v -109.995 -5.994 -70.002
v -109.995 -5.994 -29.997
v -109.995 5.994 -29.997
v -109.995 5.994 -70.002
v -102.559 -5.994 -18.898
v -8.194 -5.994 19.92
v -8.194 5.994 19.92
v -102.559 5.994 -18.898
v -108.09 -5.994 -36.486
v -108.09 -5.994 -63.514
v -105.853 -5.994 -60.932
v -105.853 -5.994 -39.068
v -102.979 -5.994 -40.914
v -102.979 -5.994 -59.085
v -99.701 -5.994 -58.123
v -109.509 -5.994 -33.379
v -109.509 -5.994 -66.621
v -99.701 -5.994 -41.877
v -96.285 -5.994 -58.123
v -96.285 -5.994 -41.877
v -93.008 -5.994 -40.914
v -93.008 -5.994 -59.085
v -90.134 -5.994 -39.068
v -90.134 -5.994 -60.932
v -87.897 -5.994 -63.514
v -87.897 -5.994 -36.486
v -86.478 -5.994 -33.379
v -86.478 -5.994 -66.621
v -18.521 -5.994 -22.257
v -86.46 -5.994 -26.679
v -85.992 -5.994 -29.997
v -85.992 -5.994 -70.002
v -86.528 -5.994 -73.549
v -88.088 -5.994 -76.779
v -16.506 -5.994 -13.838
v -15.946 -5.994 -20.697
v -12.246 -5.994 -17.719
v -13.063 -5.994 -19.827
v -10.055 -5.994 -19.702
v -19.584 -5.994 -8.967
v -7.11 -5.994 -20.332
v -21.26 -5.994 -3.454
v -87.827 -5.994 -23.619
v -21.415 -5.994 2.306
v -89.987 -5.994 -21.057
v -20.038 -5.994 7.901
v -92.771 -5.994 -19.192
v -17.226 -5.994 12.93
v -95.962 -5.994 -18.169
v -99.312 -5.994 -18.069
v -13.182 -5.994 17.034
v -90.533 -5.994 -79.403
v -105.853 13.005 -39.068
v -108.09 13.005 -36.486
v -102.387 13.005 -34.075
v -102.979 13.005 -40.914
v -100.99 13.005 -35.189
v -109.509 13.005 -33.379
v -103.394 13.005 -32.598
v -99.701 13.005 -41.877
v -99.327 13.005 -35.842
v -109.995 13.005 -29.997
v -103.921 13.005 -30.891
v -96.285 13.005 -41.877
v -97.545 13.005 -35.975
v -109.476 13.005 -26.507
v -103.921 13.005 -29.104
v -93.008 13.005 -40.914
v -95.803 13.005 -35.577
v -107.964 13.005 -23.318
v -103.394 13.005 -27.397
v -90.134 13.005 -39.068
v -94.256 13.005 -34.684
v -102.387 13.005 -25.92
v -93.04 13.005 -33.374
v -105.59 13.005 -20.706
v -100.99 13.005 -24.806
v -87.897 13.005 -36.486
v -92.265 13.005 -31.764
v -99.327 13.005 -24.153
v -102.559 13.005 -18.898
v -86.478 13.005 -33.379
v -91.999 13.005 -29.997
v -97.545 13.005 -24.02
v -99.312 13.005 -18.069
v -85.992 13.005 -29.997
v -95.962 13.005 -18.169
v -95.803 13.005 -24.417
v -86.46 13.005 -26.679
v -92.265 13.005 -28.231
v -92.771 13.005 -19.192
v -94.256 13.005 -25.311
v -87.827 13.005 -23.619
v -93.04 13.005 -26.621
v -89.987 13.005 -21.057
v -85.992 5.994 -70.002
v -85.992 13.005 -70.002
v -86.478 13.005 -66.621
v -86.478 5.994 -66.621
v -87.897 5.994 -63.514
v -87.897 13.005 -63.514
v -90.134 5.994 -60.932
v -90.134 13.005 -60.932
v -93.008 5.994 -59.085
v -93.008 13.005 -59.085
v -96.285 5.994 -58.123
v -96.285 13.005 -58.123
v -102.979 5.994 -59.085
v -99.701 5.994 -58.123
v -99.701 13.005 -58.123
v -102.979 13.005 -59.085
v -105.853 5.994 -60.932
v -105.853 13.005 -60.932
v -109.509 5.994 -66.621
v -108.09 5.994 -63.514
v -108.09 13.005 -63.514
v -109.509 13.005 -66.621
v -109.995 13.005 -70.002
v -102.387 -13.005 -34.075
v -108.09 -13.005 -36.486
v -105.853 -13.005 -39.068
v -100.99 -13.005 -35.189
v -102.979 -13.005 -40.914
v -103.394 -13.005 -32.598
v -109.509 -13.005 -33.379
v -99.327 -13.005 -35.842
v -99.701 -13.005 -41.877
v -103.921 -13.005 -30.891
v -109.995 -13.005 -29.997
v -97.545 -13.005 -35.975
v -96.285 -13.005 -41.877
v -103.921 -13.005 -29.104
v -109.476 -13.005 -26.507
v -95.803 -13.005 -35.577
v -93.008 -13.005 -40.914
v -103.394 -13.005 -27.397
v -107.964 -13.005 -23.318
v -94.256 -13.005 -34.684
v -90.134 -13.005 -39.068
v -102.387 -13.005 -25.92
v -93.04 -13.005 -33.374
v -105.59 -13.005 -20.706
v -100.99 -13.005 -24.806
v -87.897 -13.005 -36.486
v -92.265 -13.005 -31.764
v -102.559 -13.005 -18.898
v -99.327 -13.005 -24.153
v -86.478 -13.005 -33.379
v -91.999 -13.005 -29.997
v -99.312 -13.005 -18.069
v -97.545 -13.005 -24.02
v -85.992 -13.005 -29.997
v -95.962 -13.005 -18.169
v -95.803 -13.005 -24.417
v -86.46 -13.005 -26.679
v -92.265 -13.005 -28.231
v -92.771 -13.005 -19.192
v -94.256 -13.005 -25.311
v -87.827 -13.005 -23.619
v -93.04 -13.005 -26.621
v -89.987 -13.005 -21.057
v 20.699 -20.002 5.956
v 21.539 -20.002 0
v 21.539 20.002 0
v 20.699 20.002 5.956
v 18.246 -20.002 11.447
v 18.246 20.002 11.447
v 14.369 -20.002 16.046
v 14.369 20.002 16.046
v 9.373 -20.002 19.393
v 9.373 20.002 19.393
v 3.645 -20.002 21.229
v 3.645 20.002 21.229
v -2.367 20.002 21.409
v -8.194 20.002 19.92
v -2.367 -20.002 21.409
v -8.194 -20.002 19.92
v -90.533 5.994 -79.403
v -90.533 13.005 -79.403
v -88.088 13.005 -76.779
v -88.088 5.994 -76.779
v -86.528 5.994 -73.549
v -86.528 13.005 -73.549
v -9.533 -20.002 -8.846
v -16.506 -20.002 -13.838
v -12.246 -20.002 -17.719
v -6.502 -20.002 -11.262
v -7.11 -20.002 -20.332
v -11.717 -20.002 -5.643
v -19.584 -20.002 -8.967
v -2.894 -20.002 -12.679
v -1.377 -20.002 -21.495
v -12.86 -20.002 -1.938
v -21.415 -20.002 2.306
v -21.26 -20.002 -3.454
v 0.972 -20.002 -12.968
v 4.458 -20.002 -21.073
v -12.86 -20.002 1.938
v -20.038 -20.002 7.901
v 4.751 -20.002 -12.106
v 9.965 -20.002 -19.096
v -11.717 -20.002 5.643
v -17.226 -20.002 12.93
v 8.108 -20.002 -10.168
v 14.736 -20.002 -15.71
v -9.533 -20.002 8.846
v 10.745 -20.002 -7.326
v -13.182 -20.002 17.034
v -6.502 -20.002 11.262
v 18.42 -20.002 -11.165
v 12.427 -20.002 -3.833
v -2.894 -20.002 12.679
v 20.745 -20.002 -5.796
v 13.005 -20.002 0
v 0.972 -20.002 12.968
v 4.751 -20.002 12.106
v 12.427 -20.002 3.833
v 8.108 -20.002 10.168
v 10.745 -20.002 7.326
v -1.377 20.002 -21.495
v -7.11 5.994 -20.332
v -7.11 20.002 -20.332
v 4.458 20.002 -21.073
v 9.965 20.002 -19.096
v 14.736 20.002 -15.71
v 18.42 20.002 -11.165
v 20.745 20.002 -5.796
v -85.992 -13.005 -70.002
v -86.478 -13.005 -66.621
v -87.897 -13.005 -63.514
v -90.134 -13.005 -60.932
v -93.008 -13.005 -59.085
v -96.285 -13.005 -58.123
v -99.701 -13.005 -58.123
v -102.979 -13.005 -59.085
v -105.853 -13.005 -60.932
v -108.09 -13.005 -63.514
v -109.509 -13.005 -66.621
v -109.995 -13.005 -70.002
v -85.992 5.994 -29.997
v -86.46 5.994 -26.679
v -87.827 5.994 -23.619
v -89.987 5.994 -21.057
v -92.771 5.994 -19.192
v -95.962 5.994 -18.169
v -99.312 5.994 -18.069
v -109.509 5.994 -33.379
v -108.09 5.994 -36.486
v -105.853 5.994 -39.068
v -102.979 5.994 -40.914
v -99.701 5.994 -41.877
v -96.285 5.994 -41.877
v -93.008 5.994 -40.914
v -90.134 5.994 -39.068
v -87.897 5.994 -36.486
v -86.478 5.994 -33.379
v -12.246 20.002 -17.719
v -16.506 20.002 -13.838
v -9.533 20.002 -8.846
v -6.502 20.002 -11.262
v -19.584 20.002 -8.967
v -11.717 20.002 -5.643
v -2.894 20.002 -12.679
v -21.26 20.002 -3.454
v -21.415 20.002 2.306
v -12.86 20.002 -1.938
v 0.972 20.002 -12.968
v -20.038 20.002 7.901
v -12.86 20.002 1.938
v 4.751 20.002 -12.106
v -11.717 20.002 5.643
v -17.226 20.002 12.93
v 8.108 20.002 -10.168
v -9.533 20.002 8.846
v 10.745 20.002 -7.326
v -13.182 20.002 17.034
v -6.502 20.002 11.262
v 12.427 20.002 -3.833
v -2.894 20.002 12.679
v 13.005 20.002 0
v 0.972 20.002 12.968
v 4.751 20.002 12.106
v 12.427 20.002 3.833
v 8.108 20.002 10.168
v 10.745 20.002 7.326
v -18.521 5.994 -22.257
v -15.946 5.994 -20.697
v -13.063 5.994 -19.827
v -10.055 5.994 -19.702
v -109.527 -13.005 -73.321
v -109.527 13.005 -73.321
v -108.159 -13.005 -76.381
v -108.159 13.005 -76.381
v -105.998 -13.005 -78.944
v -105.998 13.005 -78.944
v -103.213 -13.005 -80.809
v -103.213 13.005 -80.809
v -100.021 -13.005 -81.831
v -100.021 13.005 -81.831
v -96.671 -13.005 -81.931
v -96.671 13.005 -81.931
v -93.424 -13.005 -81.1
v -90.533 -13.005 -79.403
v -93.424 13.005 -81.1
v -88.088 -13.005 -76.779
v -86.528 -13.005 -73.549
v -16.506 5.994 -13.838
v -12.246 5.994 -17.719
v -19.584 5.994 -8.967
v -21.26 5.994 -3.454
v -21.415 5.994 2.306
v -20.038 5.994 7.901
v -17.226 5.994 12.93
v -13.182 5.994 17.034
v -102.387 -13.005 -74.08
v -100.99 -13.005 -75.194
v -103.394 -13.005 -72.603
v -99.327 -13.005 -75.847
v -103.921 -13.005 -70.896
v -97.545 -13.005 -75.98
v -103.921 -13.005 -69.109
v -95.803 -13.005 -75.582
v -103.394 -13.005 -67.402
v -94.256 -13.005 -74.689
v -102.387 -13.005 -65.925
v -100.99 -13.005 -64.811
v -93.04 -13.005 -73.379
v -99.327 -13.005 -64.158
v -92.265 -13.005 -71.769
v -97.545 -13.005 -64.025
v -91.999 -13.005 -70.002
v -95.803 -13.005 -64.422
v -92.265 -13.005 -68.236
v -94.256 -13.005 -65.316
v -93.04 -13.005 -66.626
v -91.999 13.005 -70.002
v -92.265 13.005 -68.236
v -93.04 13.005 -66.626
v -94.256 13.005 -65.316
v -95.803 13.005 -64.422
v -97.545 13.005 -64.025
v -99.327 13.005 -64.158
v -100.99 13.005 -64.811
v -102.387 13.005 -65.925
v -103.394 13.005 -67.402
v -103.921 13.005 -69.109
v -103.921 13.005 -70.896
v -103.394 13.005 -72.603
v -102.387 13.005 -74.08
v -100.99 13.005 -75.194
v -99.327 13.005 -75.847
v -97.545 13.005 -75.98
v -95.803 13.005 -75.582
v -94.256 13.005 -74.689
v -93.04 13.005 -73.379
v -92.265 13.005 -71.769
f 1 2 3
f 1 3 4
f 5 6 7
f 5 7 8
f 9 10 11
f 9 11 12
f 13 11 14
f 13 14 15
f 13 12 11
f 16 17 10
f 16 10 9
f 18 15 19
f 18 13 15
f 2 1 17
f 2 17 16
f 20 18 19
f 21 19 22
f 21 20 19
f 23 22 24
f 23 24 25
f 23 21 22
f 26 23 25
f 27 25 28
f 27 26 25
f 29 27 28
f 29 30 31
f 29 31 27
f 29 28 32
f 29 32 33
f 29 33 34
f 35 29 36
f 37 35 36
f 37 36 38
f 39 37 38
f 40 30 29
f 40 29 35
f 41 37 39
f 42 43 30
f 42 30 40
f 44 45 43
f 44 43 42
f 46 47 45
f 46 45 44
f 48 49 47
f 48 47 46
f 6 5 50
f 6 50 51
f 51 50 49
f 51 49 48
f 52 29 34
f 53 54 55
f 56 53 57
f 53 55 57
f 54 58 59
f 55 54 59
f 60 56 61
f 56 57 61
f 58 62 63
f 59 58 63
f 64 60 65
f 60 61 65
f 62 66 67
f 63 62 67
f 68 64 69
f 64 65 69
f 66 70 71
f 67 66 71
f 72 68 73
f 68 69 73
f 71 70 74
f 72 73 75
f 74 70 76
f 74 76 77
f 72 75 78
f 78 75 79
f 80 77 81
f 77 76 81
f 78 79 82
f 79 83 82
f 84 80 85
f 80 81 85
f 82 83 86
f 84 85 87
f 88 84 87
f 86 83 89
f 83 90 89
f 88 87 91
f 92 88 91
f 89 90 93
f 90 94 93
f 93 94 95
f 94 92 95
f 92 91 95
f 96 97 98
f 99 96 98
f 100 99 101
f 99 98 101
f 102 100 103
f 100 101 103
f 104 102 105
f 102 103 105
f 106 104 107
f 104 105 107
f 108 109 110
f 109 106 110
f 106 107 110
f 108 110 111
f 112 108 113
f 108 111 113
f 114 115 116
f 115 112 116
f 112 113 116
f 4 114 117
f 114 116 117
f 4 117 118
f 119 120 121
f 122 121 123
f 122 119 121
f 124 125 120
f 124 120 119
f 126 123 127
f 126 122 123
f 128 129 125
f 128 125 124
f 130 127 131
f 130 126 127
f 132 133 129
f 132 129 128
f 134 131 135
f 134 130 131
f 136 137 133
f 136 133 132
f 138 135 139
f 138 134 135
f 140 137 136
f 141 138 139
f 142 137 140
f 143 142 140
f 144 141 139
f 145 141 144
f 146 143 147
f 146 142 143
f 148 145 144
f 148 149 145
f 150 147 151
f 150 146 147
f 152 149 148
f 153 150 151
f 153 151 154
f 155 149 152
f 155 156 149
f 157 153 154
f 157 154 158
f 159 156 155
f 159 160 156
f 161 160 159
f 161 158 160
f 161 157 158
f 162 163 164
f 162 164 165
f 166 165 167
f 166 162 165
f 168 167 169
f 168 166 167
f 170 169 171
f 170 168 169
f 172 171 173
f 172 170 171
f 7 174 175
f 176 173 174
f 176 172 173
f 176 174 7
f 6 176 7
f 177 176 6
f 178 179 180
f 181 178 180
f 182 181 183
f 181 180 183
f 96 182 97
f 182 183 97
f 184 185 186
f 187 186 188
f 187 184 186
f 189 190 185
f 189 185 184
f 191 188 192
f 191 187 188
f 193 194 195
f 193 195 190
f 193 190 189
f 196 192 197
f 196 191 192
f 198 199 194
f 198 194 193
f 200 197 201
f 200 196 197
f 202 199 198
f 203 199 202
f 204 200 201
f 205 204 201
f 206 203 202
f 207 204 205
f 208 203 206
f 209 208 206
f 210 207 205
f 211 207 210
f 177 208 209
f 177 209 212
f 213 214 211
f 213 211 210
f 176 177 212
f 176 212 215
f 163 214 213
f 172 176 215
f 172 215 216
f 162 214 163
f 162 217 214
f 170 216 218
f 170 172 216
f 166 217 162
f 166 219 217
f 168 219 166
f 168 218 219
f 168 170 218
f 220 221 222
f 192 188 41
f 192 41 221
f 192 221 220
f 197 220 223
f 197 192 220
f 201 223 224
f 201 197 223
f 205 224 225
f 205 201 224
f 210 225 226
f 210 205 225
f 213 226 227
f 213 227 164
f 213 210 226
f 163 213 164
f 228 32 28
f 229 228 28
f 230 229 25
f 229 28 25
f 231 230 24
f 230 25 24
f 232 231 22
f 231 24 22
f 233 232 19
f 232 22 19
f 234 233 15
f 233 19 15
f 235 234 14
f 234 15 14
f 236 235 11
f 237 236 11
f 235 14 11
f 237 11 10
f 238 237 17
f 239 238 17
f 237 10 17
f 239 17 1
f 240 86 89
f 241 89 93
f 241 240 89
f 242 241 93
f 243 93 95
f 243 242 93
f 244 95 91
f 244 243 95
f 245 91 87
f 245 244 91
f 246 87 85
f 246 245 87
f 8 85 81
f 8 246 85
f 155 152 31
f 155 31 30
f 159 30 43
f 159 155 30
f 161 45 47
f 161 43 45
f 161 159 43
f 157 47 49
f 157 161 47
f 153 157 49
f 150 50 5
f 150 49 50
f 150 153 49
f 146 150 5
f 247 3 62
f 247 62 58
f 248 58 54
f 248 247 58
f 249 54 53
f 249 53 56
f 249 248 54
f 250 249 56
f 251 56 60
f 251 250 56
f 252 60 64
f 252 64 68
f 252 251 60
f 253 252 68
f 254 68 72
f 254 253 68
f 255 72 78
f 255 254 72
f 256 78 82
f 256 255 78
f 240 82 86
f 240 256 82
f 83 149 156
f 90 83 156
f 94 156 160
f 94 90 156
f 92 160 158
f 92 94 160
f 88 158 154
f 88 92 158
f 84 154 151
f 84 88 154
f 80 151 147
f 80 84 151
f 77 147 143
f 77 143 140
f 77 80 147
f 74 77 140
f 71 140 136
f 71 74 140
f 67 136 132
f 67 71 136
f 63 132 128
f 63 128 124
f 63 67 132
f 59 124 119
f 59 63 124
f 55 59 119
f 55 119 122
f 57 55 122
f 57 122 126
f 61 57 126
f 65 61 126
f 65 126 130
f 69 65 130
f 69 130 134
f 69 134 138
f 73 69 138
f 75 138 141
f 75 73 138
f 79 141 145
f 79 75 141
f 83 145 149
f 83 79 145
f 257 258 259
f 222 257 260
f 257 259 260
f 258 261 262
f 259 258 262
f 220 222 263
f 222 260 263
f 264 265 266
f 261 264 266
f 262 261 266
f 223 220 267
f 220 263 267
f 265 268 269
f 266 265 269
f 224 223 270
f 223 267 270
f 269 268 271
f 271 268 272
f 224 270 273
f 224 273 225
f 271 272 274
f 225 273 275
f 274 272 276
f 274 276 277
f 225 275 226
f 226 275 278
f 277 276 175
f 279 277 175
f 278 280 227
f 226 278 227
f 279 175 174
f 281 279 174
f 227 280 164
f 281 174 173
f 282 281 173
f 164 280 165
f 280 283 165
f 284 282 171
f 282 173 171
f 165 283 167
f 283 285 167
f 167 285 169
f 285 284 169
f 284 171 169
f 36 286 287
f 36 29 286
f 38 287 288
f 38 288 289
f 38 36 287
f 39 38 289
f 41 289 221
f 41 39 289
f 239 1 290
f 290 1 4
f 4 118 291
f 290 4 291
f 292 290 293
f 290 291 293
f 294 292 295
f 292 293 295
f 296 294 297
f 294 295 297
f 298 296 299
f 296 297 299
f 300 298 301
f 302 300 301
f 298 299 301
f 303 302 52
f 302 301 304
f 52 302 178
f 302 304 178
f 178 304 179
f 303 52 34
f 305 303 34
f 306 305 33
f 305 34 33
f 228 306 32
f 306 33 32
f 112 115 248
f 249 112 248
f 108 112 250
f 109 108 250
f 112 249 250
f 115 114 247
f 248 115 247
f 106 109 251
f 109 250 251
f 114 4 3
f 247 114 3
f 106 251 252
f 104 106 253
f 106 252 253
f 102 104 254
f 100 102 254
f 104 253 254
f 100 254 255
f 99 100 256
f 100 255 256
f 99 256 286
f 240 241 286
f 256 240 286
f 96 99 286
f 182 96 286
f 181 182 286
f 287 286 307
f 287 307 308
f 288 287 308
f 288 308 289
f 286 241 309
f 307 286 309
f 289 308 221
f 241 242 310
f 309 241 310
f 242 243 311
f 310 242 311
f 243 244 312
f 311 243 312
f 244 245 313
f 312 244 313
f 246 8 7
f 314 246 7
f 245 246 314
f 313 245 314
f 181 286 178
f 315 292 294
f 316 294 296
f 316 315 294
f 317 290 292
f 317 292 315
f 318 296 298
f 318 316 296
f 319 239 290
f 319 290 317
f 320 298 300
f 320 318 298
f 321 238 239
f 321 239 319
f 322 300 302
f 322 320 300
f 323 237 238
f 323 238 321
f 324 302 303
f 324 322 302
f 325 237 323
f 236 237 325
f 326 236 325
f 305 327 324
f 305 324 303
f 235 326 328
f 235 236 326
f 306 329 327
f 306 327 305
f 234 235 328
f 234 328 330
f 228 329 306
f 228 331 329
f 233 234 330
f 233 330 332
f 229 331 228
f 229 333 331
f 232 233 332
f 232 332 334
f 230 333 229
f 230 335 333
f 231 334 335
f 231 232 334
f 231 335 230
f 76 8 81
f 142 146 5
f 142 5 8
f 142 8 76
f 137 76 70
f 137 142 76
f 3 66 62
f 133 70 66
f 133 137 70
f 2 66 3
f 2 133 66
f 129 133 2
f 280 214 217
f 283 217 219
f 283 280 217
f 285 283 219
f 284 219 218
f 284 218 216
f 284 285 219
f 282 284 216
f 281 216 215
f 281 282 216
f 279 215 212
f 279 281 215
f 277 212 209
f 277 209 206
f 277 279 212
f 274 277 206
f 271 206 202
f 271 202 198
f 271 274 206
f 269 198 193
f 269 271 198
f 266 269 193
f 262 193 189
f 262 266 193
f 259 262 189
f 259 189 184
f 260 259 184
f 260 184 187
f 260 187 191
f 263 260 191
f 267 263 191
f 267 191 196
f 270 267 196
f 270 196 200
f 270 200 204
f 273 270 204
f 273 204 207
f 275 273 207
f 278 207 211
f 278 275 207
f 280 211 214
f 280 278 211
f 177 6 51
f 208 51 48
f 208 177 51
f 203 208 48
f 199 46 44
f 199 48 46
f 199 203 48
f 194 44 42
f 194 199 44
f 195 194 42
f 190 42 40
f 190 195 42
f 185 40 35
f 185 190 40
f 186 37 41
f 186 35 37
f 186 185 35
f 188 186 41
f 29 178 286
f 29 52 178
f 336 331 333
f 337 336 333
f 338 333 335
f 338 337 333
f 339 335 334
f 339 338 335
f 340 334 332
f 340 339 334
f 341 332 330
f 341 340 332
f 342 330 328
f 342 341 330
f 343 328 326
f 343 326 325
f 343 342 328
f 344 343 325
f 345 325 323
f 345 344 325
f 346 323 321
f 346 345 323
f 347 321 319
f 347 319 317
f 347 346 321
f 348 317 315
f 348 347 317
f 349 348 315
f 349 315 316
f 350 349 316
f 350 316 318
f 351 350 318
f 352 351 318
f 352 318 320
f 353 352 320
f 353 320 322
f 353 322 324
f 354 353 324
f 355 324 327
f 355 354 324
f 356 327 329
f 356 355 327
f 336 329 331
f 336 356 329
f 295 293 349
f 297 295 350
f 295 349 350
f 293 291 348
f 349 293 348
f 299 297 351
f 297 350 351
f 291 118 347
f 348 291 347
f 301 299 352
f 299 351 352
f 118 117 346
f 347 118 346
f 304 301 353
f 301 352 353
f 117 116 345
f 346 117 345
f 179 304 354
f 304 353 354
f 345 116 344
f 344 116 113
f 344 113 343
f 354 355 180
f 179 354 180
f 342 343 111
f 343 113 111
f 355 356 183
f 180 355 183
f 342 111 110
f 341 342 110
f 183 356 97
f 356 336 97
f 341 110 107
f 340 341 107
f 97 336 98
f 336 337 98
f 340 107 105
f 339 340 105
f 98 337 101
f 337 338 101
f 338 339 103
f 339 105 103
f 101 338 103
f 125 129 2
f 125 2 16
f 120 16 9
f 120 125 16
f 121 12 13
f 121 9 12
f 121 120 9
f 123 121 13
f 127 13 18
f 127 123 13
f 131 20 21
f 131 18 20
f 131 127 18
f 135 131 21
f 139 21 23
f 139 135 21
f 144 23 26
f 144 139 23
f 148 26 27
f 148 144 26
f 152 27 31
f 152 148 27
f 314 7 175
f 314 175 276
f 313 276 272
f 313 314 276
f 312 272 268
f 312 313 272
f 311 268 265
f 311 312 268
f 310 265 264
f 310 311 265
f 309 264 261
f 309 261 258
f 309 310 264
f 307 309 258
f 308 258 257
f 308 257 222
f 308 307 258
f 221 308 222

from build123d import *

# Parameters (mm, degrees)
F0_R     = 13.0048
F1_DEPTH = 20.0025
F2_DEPTH = 5.9944
F0_R_2   = 5.9944
F3_DEPTH = 13.0048


with BuildPart() as f1:
    # F0 (on Front) → F1 (new body, symmetric)
    with BuildSketch(Plane.XZ):
        with BuildLine():
            ThreePointArc((-7.110495, -20.331699), (12.465608, -17.56547), (21.5392, 0))
            ThreePointArc((21.5392, 0), (11.988357, 17.894593), (-8.194164, 19.919659))
            ThreePointArc((-8.194164, 19.919659), (-21.531398, -0.57968), (-7.110495, -20.331699))
        make_face()
        Circle(F0_R, mode=Mode.SUBTRACT)
    extrude(amount=F1_DEPTH, both=True)

    # F0 (on Front) → F2 (join, symmetric)
    with BuildSketch(Plane.XZ):
        with BuildLine():
            ThreePointArc((-7.110495, -20.331699), (-21.531398, -0.57968), (-8.194164, 19.919659))
            Line((-8.194164, 19.919659), (-102.558934, -18.898298))
            ThreePointArc((-102.558934, -18.898298), (-91.313367, -20.026651), (-85.9917, -29.9974))
            ThreePointArc((-85.9917, -29.9974), (-97.9932, -41.9989), (-109.9947, -29.9974))
            Line((-109.9947, -29.9974), (-109.9947, -70.0024))
            ThreePointArc((-109.9947, -70.0024), (-97.9932, -58.0009), (-85.9917, -70.0024))
            ThreePointArc((-85.9917, -70.0024), (-87.186467, -75.222604), (-90.532888, -79.40345))
            Line((-90.532888, -79.40345), (-18.520641, -22.257298))
            ThreePointArc((-18.520641, -22.257298), (-13.063266, -19.826762), (-7.110495, -20.331699))
        make_face()
    extrude(amount=F2_DEPTH, both=True)

    # F0 (on Front) → F3 (join, symmetric)
    with BuildSketch(Plane.XZ):
        with BuildLine():
            ThreePointArc((-109.9947, -70.0024), (-103.213404, -80.809133), (-90.532888, -79.40345))
            ThreePointArc((-90.532888, -79.40345), (-87.186467, -75.222604), (-85.9917, -70.0024))
            ThreePointArc((-85.9917, -70.0024), (-97.9932, -58.0009), (-109.9947, -70.0024))
        make_face()
        with Locations((-97.9932, -70.0024)):
            Circle(F0_R_2, mode=Mode.SUBTRACT)
        with BuildLine():
            ThreePointArc((-85.9917, -29.9974), (-91.313367, -20.026651), (-102.558934, -18.898298))
            ThreePointArc((-102.558934, -18.898298), (-107.963949, -23.317567), (-109.9947, -29.9974))
            ThreePointArc((-109.9947, -29.9974), (-97.9932, -41.9989), (-85.9917, -29.9974))
        make_face()
        with Locations((-97.9932, -29.9974)):
            Circle(F0_R_2, mode=Mode.SUBTRACT)
    extrude(amount=F3_DEPTH, both=True)


solid = f1.part
